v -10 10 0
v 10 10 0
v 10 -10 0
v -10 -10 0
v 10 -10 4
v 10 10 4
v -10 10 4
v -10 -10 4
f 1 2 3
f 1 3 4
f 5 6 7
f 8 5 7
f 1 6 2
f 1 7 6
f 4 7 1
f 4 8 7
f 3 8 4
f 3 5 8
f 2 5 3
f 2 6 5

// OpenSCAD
// Generated by DescriptiveCAD bootstrap v0.2
color([0.8, 0.8, 0.8, 0.15]) {
  // boundary visualization
  polyhedron(points=[[-34.586832, 83.505000, 0.000000], [34.586832, 83.505000, 0.000000], [34.586832, 83.495000, 0.000000], [-34.586832, 83.495000, 0.000000], [-34.586832, 83.505000, 13.750000], [34.586832, 83.505000, 13.750000], [34.586832, 83.495000, 13.750000], [-34.586832, 83.495000, 13.750000]], faces=[[0, 1, 2, 3], [4, 5, 6, 7], [0, 1, 5, 4], [1, 2, 6, 5], [2, 3, 7, 6], [3, 0, 4, 7]]);
  polyhedron(points=[[34.590368, 83.503536, 0.000000], [83.503536, 34.590368, 0.000000], [83.496464, 34.583297, 0.000000], [34.583297, 83.496464, 0.000000], [34.590368, 83.503536, 13.750000], [83.503536, 34.590368, 13.750000], [83.496464, 34.583297, 13.750000], [34.583297, 83.496464, 13.750000]], faces=[[0, 1, 2, 3], [4, 5, 6, 7], [0, 1, 5, 4], [1, 2, 6, 5], [2, 3, 7, 6], [3, 0, 4, 7]]);
  polyhedron(points=[[83.505000, 34.586832, 0.000000], [83.505000, -34.586832, 0.000000], [83.495000, -34.586832, 0.000000], [83.495000, 34.586832, 0.000000], [83.505000, 34.586832, 13.750000], [83.505000, -34.586832, 13.750000], [83.495000, -34.586832, 13.750000], [83.495000, 34.586832, 13.750000]], faces=[[0, 1, 2, 3], [4, 5, 6, 7], [0, 1, 5, 4], [1, 2, 6, 5], [2, 3, 7, 6], [3, 0, 4, 7]]);
  polyhedron(points=[[83.503536, -34.590368, 0.000000], [34.590368, -83.503536, 0.000000], [34.583297, -83.496464, 0.000000], [83.496464, -34.583297, 0.000000], [83.503536, -34.590368, 13.750000], [34.590368, -83.503536, 13.750000], [34.583297, -83.496464, 13.750000], [83.496464, -34.583297, 13.750000]], faces=[[0, 1, 2, 3], [4, 5, 6, 7], [0, 1, 5, 4], [1, 2, 6, 5], [2, 3, 7, 6], [3, 0, 4, 7]]);
  polyhedron(points=[[34.586832, -83.505000, 0.000000], [-34.586832, -83.505000, 0.000000], [-34.586832, -83.495000, 0.000000], [34.586832, -83.495000, 0.000000], [34.586832, -83.505000, 13.750000], [-34.586832, -83.505000, 13.750000], [-34.586832, -83.495000, 13.750000], [34.586832, -83.495000, 13.750000]], faces=[[0, 1, 2, 3], [4, 5, 6, 7], [0, 1, 5, 4], [1, 2, 6, 5], [2, 3, 7, 6], [3, 0, 4, 7]]);
  polyhedron(points=[[-34.590368, -83.503536, 0.000000], [-83.503536, -34.590368, 0.000000], [-83.496464, -34.583297, 0.000000], [-34.583297, -83.496464, 0.000000], [-34.590368, -83.503536, 13.750000], [-83.503536, -34.590368, 13.750000], [-83.496464, -34.583297, 13.750000], [-34.583297, -83.496464, 13.750000]], faces=[[0, 1, 2, 3], [4, 5, 6, 7], [0, 1, 5, 4], [1, 2, 6, 5], [2, 3, 7, 6], [3, 0, 4, 7]]);
  polyhedron(points=[[-83.505000, -34.586832, 0.000000], [-83.505000, 34.586832, 0.000000], [-83.495000, 34.586832, 0.000000], [-83.495000, -34.586832, 0.000000], [-83.505000, -34.586832, 13.750000], [-83.505000, 34.586832, 13.750000], [-83.495000, 34.586832, 13.750000], [-83.495000, -34.586832, 13.750000]], faces=[[0, 1, 2, 3], [4, 5, 6, 7], [0, 1, 5, 4], [1, 2, 6, 5], [2, 3, 7, 6], [3, 0, 4, 7]]);
  polyhedron(points=[[-83.503536, 34.590368, 0.000000], [-34.590368, 83.503536, 0.000000], [-34.583297, 83.496464, 0.000000], [-83.496464, 34.583297, 0.000000], [-83.503536, 34.590368, 13.750000], [-34.590368, 83.503536, 13.750000], [-34.583297, 83.496464, 13.750000], [-83.496464, 34.583297, 13.750000]], faces=[[0, 1, 2, 3], [4, 5, 6, 7], [0, 1, 5, 4], [1, 2, 6, 5], [2, 3, 7, 6], [3, 0, 4, 7]]);
}
color([0, 0, 1, 1]) {
  translate([0,0,0]) linear_extrude(height=4) polygon(points=[[-10.000000, -10.000000], [10.000000, -10.000000], [10.000000, 10.000000], [-10.000000, 10.000000]]);
}
